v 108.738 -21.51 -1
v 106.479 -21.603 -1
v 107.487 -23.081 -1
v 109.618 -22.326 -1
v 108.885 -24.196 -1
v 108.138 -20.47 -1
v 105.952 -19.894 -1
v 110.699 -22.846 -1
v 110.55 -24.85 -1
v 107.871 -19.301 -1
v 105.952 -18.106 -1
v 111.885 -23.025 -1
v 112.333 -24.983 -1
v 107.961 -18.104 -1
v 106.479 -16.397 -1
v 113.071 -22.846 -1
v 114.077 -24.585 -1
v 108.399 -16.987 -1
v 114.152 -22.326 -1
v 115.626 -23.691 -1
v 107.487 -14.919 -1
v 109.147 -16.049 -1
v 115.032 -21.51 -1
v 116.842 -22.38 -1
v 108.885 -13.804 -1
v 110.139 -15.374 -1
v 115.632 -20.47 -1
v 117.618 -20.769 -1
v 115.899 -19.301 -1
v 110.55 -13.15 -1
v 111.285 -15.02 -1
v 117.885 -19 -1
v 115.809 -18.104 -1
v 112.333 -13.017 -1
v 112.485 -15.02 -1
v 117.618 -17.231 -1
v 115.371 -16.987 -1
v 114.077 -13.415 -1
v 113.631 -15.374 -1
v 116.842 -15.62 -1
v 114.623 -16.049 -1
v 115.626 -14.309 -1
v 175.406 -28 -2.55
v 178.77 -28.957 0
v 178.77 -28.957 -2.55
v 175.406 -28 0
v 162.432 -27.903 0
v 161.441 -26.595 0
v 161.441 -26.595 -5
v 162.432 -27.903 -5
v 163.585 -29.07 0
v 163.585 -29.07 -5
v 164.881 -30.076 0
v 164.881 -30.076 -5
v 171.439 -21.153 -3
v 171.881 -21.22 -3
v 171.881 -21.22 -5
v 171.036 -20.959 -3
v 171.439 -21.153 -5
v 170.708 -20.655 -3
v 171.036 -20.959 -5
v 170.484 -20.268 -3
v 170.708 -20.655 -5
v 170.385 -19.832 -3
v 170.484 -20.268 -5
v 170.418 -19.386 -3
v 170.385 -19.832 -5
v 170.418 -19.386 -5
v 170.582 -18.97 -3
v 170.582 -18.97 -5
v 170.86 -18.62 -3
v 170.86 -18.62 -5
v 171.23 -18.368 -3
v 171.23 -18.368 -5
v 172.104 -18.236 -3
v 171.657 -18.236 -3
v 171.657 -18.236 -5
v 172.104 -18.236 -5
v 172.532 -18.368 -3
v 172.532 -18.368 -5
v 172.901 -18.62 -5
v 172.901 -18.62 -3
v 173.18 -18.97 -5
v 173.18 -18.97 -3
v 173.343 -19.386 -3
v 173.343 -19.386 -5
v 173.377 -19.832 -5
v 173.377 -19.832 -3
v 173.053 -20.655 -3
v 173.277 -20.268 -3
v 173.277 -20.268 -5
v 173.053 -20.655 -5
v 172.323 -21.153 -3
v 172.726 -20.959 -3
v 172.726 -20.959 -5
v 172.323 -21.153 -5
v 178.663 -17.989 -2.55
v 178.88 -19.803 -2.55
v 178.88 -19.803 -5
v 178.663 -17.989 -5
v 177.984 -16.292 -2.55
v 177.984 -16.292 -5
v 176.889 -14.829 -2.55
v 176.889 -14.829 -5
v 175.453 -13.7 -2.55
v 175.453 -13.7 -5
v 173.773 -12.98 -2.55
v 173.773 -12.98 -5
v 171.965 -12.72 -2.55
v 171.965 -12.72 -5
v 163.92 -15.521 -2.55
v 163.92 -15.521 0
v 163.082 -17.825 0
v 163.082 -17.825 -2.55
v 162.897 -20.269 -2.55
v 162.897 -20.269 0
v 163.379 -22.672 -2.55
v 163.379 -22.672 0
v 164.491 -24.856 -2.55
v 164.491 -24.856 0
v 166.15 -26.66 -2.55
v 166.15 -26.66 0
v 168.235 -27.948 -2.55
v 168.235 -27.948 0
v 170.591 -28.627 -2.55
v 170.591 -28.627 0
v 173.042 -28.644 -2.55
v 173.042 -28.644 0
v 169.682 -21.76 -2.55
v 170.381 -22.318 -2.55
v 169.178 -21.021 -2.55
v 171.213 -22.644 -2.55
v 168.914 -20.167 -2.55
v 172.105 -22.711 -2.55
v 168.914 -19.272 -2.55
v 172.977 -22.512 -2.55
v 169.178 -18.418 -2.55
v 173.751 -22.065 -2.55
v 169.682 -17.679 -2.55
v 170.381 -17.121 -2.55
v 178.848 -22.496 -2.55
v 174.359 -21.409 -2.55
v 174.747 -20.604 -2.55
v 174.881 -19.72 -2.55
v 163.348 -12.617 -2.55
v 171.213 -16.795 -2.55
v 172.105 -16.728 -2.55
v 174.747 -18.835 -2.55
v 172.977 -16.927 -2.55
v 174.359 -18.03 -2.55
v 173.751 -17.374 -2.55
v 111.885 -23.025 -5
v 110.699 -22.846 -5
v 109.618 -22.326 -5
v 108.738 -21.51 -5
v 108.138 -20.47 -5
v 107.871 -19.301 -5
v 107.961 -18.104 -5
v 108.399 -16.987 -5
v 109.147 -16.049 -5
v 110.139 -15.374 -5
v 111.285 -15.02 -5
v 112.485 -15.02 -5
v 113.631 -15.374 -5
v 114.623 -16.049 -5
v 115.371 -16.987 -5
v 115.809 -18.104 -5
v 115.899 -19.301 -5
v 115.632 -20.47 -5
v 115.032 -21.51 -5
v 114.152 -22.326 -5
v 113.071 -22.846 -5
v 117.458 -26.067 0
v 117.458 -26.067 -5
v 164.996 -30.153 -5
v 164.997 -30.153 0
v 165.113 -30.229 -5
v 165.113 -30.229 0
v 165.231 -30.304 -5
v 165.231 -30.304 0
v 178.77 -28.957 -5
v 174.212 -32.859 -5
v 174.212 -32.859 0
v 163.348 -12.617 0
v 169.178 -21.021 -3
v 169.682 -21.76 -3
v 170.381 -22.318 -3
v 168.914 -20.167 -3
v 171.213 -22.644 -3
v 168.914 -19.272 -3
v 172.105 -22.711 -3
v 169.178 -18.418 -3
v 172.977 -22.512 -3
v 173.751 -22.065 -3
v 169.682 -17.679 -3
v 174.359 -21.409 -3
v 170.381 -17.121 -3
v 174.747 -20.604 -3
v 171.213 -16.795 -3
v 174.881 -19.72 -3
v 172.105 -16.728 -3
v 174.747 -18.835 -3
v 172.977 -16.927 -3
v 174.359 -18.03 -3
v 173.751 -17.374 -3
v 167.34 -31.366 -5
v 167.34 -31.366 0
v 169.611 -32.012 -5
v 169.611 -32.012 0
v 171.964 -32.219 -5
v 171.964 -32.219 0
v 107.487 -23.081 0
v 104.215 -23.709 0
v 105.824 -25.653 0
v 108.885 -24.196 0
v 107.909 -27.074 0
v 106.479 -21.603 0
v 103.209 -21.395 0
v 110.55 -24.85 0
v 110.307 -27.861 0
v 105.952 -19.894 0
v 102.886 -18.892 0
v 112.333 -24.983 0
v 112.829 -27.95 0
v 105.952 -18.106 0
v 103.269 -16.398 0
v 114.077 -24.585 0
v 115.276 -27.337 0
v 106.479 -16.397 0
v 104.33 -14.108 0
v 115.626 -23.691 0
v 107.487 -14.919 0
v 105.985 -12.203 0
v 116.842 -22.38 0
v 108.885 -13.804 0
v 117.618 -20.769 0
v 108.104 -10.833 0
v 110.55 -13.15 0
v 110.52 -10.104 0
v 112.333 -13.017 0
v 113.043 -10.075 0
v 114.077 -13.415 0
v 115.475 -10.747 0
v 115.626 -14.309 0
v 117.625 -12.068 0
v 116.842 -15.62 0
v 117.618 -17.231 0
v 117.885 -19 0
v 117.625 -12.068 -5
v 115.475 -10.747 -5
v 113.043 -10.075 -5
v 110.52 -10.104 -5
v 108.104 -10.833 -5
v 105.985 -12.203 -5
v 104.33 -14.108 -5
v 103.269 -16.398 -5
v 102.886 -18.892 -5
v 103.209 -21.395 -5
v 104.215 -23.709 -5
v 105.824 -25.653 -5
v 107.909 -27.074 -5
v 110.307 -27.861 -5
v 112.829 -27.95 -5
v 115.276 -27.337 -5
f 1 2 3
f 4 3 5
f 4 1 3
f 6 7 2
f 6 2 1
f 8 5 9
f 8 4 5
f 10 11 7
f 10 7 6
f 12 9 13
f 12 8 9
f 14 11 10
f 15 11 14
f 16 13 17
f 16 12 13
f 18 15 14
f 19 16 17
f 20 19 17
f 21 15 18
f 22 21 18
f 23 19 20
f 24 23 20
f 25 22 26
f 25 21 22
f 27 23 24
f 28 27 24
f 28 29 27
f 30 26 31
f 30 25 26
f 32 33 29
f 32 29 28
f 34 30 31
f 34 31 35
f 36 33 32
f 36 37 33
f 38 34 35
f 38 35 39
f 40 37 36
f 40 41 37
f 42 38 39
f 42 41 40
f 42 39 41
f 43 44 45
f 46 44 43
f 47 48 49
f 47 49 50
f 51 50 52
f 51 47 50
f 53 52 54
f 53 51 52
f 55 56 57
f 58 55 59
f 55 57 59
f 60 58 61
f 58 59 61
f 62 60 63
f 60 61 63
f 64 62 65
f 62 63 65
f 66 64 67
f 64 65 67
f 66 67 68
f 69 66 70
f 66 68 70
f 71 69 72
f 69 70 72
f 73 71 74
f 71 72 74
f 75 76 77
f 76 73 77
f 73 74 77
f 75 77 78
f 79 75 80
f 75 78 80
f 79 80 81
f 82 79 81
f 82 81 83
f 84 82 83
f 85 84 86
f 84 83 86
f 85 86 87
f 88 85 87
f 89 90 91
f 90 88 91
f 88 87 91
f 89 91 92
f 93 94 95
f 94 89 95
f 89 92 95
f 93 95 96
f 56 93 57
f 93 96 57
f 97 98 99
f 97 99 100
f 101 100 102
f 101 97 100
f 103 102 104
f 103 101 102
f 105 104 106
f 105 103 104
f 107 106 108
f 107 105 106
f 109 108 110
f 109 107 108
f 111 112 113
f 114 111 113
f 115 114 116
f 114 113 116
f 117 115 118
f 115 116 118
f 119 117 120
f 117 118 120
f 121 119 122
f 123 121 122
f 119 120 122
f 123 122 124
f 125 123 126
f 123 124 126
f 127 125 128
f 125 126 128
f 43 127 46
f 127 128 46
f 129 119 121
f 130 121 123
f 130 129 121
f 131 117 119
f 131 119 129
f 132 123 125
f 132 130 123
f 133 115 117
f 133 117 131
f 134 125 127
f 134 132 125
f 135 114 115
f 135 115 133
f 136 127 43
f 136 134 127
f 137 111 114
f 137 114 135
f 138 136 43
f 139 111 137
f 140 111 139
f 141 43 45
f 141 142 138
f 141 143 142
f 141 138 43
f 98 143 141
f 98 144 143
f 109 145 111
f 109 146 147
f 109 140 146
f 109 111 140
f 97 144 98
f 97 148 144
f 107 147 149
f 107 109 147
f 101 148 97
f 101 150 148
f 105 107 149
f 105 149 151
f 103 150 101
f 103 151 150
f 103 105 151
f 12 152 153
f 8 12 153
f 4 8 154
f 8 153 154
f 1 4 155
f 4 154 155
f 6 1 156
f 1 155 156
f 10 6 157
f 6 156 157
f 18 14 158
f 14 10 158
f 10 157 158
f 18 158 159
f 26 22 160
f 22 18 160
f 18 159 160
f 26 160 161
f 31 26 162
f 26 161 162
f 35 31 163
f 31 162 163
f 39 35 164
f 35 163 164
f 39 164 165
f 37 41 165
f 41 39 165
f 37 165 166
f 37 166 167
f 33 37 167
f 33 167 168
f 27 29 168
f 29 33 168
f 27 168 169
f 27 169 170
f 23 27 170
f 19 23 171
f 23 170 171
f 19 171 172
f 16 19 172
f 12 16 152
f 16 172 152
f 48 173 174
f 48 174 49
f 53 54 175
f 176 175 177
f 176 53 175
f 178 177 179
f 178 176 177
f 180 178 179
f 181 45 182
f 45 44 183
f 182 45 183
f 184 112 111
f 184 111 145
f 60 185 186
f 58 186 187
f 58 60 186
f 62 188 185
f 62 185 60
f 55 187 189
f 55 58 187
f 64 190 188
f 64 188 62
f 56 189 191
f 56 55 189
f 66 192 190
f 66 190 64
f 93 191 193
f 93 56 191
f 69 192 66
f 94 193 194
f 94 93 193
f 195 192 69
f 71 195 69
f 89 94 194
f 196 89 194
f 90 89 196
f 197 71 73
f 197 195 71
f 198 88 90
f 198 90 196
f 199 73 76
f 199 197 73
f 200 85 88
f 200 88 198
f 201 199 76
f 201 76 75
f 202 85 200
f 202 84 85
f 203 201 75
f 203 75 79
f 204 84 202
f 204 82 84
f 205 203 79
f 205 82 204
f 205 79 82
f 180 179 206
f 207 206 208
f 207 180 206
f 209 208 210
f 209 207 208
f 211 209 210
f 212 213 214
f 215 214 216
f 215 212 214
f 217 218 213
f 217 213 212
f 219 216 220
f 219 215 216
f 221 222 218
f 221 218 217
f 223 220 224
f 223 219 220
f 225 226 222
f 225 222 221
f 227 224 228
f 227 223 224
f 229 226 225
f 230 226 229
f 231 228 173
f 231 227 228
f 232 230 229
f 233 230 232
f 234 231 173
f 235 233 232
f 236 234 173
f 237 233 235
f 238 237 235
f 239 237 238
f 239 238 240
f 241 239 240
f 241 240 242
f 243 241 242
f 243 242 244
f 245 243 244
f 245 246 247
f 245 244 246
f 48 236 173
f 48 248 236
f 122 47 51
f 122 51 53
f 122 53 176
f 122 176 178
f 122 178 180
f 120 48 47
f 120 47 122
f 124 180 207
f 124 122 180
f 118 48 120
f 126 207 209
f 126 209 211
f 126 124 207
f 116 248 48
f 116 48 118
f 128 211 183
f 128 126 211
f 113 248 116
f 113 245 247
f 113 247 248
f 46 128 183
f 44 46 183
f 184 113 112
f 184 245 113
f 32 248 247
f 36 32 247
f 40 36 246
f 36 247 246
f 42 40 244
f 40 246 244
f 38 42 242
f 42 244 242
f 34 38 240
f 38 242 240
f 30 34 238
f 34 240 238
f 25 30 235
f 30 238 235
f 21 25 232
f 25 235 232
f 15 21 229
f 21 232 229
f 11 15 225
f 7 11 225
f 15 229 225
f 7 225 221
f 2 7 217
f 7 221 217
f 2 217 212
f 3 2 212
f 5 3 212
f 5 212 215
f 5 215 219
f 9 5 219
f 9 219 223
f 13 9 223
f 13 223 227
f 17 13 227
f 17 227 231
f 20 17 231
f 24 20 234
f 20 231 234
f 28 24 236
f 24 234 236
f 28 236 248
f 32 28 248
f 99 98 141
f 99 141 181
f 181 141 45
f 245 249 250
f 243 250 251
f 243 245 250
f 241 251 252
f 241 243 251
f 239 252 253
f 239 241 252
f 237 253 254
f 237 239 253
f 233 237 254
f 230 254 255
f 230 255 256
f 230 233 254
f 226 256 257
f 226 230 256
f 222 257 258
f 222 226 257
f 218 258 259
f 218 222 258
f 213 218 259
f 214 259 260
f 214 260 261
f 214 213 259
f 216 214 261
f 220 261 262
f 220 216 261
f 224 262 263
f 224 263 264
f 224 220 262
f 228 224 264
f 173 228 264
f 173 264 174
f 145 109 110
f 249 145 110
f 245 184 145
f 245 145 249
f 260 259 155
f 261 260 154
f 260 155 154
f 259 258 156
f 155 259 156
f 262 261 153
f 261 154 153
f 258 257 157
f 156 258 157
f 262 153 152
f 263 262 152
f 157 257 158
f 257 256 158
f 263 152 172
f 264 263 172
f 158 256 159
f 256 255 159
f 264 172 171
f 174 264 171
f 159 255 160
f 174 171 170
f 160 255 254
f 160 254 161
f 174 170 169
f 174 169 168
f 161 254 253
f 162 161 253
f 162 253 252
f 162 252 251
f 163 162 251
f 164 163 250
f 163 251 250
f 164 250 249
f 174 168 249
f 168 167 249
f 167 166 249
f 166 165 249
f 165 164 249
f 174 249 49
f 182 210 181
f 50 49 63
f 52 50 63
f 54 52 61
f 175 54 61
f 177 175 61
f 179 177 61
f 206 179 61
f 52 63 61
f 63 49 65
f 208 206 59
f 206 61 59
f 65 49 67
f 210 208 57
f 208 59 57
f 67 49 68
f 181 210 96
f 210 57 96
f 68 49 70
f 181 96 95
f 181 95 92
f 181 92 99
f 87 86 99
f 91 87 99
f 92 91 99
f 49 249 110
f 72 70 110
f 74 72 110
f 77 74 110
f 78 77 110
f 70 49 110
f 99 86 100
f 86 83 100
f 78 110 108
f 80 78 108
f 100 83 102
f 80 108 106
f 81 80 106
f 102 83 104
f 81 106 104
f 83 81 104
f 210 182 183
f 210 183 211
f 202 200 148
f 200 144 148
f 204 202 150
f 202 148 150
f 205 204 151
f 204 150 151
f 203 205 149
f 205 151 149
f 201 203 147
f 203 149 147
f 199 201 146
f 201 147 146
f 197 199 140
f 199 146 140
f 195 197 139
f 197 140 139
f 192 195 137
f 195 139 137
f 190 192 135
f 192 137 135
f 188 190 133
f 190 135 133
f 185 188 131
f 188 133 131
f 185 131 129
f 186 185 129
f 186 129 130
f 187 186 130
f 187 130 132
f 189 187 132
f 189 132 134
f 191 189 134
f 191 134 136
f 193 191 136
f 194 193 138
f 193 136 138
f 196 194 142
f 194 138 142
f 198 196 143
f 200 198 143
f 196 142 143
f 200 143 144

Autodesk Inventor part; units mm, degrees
ref_plane "YZ Plane" through (0, 0, 0) normal (1, 0, 0) x (0, 1, 0)
ref_plane "XZ Plane" through (0, 0, 0) normal (0, 1, 0) x (-1, 0, 0)
ref_plane "XY Plane" through (0, 0, 0) normal (0, 0, 1) x (1, 0, 0)
sketch "スケッチ1" plane through (0, 0, 0) normal (0, 0, 1) x (1, 0, 0)
  line L0 (-101.5, 48) -> (108.5, 48)
  circle A0 centre (111.885, -19) radius 4
  circle A1 centre (171.8807, -19.7195) radius 4
  circle A2 centre (111.885, -19) radius 7
  circle A3 centre (171.8807, -19.7195) radius 7
  line L1 (171.8807, -19.7195) -> (111.885, -19) construction
  line L2 (171.9647, -12.72) -> (111.969, -12.0005)
  line L3 (111.8011, -25.9995) -> (171.7968, -26.719)
  arc A4 (171.7968, -26.719) -> (171.9647, -12.72) centre (171.8807, -19.7195) ccw
  arc A5 (111.969, -12.0005) -> (111.8011, -25.9995) centre (111.885, -19) ccw
  line L4 (173.7961, -12.9866) -> (250.1906, -34.7195)
  circle A6 centre (241.9819, -63.5746) radius 30
  line L5 (268.18, -78.1916) -> (221.9512, -41.2414)
  line L6 (221.9512, -41.2414) -> (169.9654, -26.4523)
  line L7 (271.9819, -113.1361) -> (271.9819, -54.8199)
  line L8 (111.885, -19) -> (111.885, 41) construction
  line L9 (118.885, -19) -> (118.885, 41)
  line L10 (104.885, 41) -> (104.885, -19)
  arc A7 (104.885, -19) -> (118.885, -19) centre (111.885, -19) ccw
  arc A8 (118.885, 41) -> (104.885, 41) centre (111.885, 41) ccw
  circle A9 centre (29.4318, 47.238) radius 30
  line L11 (113.3193, 34.1485) -> (35.5787, 17.8745)
  line L12 (-0.5585, 48) -> (57.5489, 36.7771)
  line L13 (57.5489, 36.7771) -> (110.4508, 47.8515)
  circle A10 centre (113.5, -20) radius 68
  line L14 (321.9635, -82.9551) -> (60.2705, 100.2843)
  line L15 (259.1892, -39) -> (111.885, -19)
  arc A11 (93.5924, -27.1048) -> (135.371, -5.9244) centre (95.0604, 21.7941) ccw
  arc A12 (135.371, -5.9244) -> (135.8476, -3.6716) centre (132.899, -4.2246) ccw
  arc A13 (135.8476, -3.6716) -> (83.1833, 18.5565) centre (102.1579, -9.9896) ccw
  line L16 (111.885, -19) -> (112.6892, 40.9946) construction
  line L17 (118.8844, -19.0938) -> (119.6886, 40.9008)
  line L18 (105.6898, 41.0884) -> (104.8857, -18.9062)
  arc A14 (104.8857, -18.9062) -> (118.8844, -19.0938) centre (111.885, -19) ccw
  arc A15 (119.6886, 40.9008) -> (105.6898, 41.0884) centre (112.6892, 40.9946) ccw
  line L19 (164.9949, 48) -> (164.9949, 26)
  line L20 (164.9949, 26) -> (327.4949, -102)
  circle A16 centre (116.2926, -40) radius 68
  circle A17 centre (-98.885, 0) radius 67.5
  line L21 (321.3633, -8.501) -> (-152.6681, 78.4982)
  line L22 (104.8897, -3) -> (104.8897, 0)
  line L23 (104.8897, -3) -> (72.0656, -3)
  line L24 (72.0656, 0) -> (104.8897, 0)
  circle A18 centre (83.3769, -17.5) radius 13.85
  line L25 (178.7705, -28.9572) -> (174.2123, -32.8589)
  line L26 (174.2123, -32.8589) -> (164.8807, -30.2042)
  line L27 (164.8807, -30.2042) -> (164.8807, -19.7195)
  line L28 (169.9654, -26.4523) -> (168.5972, -31.2615)
  line L29 (168.5972, -31.2615) -> (164.8807, -26.636)
  line L30 (178.8802, -19.8034) -> (178.6547, -38.6089)
  line L31 (165.0125, -21.0715) -> (158.1724, 13.6763)
  circle A19 centre (171.8807, -19.7195) radius 7.5
  point P0 (0, 0)
  point P1 (141.8829, -19.3597)
  point P2 (111.885, 11)
  point P3 (105.885, 0)
  point P4 (105.885, 0)
  point P5 (23.7328, -42.729)
  point P6 (112.2871, 10.9973)
  point P7 (169.2723, -12.6877)
  point P8 (163.3482, -12.6166)
  point P9 (164.4925, -18.4296)
  point P10 (172.5552, -27.1891)
  point P11 (178.8479, -22.4958)
  dimension "d0" = 8
  dimension "d1" = 8
  dimension "d2" = 3
  dimension "d3" = 3
  dimension "d4" = 60
  dimension "d5" = 14
  dimension "d6" = 14
  dimension "d7" = 60
  dimension "d8" = 14
  dimension "d9" = 60
  dimension "d10" = 14
  dimension "d11" = 6
  dimension "d12" = 35
  dimension "d13" = 13.271
  dimension "d14" = 14
  dimension "d15" = 20
  dimension "d16" = 15
  dimension "d17" = 22
  dimension "d18" = 150
  dimension "d19" = 162.5
  dimension "d20" = 0
  dimension "d21" = 136
  dimension "d22" = 136
  dimension "d23" = 135
  dimension "d24" = 38.227
  dimension "d25" = 18
  dimension "d27" = 5
  dimension "d28" = 6
  dimension "d30" = 101.823
  dimension "d31" = 101.823
  dimension "d32" = 0.5
extrude "押し出し1" add sketch "スケッチ1" against normal blind 5 contours L25 L26 L28 A19 L15 L6 | L6 L15 L30 | L15 A19 L6 | L6 A19 L30 L15 | A19 L15 L28 L3 L6 | L6 L3 A3 L30 A19 | A19 L28 L15 | L29 L3 L15 A19 L28 | L26 L27 L29 | A2 A11 | L6 A3 L3 | L3 L28 L6 | L28 A19 L15 | L15 A19 L3 L28 | L27 L15 L3 | L3 A2 A11 L15 L27 | A3 | L9 A2 L2 | L2 L17 L9 | L3 A19 L27 L31 A3 L28 | L15 L3 A19 | A2 A11 | L15 L27 A19 L3 | L15 A11 L2 L31 A19 L27 | A19 L31 L2 | L2 A3 L27 L31 A19 | L2 A11 L15 A2 L17 | L31 L27 A3 | A2 L15 A11 | A19 L31 L27 | A0 | A1
extrude "押し出し2" cut sketch "スケッチ1" against normal blind 2.55 contours L6 L15 L30 | L6 A19 L30 L15 | A19 L15 L28 L3 L6 | L6 L3 A3 L30 A19 | A19 L28 L15 | L30 A3 L4 A19 | L6 A3 L3 | L3 L28 L6 | L28 A19 L15 | L15 A19 L3 L28 | A3 | L4 A3 L2 A19 | L3 A19 L27 L31 A3 L28 | A19 L31 L2 | L2 A3 L27 L31 A19 | L31 L27 A3 | A19 L31 L27 | A1
hole "穴1" at (105.885, 0, 0) at (23.7328, -42.729, 0) at (116.2926, -40, 0) at (-98.885, 0, 0) at (171.8807, -19.7195, 0) direction (0, 0, -1) diameter 3 depth 12 tip angle 118
sketch "スケッチ2" plane through (0, 0, 0) normal (0, 0, 1) x (1, 0, 0)
  line L0 (163.3482, -12.6166) -> (164.4925, -18.4296) projected
  arc A0 (164.4925, -18.4296) -> (172.5552, -27.1891) centre (171.8807, -19.7195) ccw projected
  line L1 (172.5552, -27.1891) -> (178.7705, -28.9572) projected
  line L2 (178.7705, -28.9572) -> (174.2123, -32.8589) projected
  line L3 (174.2123, -32.8589) -> (164.8807, -30.2042) projected
  line L4 (164.8807, -30.2042) -> (164.8807, -26.636) projected
  line L5 (164.8807, -26.636) -> (111.8011, -25.9995) projected
  arc A1 (111.969, -12.0005) -> (111.8011, -25.9995) centre (111.885, -19) ccw projected
  line L6 (111.969, -12.0005) -> (163.3482, -12.6166) projected
  circle A2 centre (171.8807, -19.7195) radius 7.5
  circle A3 centre (171.8807, -19.7195) radius 12.5
  point P0 (0, 0)
  point P1 (161.4414, -26.5948)
  point P2 (164.8807, -30.0756)
  point P3 (165.2308, -30.3038)
  point P4 (171.9637, -32.2192)
  dimension "d44" = 5
extrude "押し出し3" add sketch "スケッチ2" against normal blind 5 contours L5 L4 A3 | A3 L3
sketch "スケッチ3" plane through (0, 0, 0) normal (0, 0, 1) x (1, 0, 0)
  line L0 (163.3482, -12.6166) -> (164.4925, -18.4296) projected
  arc A0 (164.4925, -18.4296) -> (172.5552, -27.1891) centre (171.8807, -19.7195) ccw projected
  line L1 (172.5552, -27.1891) -> (178.7705, -28.9572) projected
  line L2 (178.7705, -28.9572) -> (174.2123, -32.8589) projected
  line L3 (174.2123, -32.8589) -> (171.9637, -32.2192) projected
  arc A1 (165.2308, -30.3038) -> (171.9637, -32.2192) centre (171.8807, -19.7195) ccw projected
  line L4 (165.2308, -30.3038) -> (164.8807, -30.2042) projected
  line L5 (164.8807, -30.2042) -> (164.8807, -30.0756) projected
  arc A2 (161.4414, -26.5948) -> (164.8807, -30.0756) centre (171.8807, -19.7195) ccw projected
  line L6 (161.4414, -26.5948) -> (111.8011, -25.9995) projected
  arc A3 (111.969, -12.0005) -> (111.8011, -25.9995) centre (111.885, -19) ccw projected
  line L7 (111.969, -12.0005) -> (163.3482, -12.6166) projected
  circle A4 centre (171.8807, -19.7195) radius 12.5
  point P0 (0, 0)
  point P1 (165.2308, -30.3038)
extrude "押し出し4" cut sketch "スケッチ3" against normal blind 10 contours A4 L4 L5
hole "穴2" at (105.885, 0, 0) at (111.885, -19, 0) direction (0, 0, -1) diameter 8.05 depth 12 tip angle 118
sketch "スケッチ4" plane through (0, 0, 0) normal (0, 0, 1) x (1, 0, 0)
  circle A0 centre (111.885, -19) radius 4.025 projected
  line L0 (163.3482, -12.6166) -> (164.4925, -18.4296) projected
  arc A1 (164.4925, -18.4296) -> (172.5552, -27.1891) centre (171.8807, -19.7195) ccw projected
  line L1 (172.5552, -27.1891) -> (178.7705, -28.9572) projected
  line L2 (178.7705, -28.9572) -> (174.2123, -32.8589) projected
  line L3 (174.2123, -32.8589) -> (171.9637, -32.2192) projected
  arc A2 (161.4414, -26.5948) -> (171.9637, -32.2192) centre (171.8807, -19.7195) ccw projected
  line L4 (161.4414, -26.5948) -> (111.8011, -25.9995) projected
  arc A3 (111.969, -12.0005) -> (111.8011, -25.9995) centre (111.885, -19) ccw projected
  line L5 (111.969, -12.0005) -> (163.3482, -12.6166) projected
  arc A4 (164.4925, -18.4296) -> (172.5552, -27.1891) centre (171.8807, -19.7195) ccw projected
  circle A5 centre (171.8807, -19.7195) radius 7.5
  circle A6 centre (171.8807, -19.7195) radius 9
  line L6 (178.7705, -28.9572) -> (172.5552, -27.1891) projected
  line L7 (164.4925, -18.4296) -> (163.3482, -12.6166) projected
  circle A7 centre (111.885, -19) radius 9
  point P0 (0, 0)
  point P1 (175.4063, -28.0002)
  point P2 (163.9203, -15.5231)
  point P3 (163.92, -15.5211)
  point P4 (175.4063, -28.0002)
  dimension "d56" = 15
  dimension "d57" = 1.5
  dimension "d58" = 18
extrude "押し出し5" add sketch "スケッチ4" against normal blind 5 contours A7 L4 A3 L5 | L5 A3 L4 A7
extrude "押し出し6" cut sketch "スケッチ4" against normal blind 2.55 contours L0 A1 L1 A6
sketch "スケッチ5" plane through (0, 0, 0) normal (0, 0, 1) x (1, 0, 0)
  arc A0 (117.6254, -12.0683) -> (117.4576, -26.0673) centre (111.885, -19) ccw projected
  line L0 (117.6254, -12.0683) -> (163.3482, -12.6166) projected
  line L1 (163.3482, -12.6166) -> (163.92, -15.5211) projected
  arc A1 (163.92, -15.5211) -> (175.4063, -28.0002) centre (171.8807, -19.7195) ccw projected
  line L2 (175.4063, -28.0002) -> (178.7705, -28.9572) projected
  line L3 (178.7705, -28.9572) -> (174.2123, -32.8589) projected
  line L4 (174.2123, -32.8589) -> (171.9637, -32.2192) projected
  arc A2 (161.4414, -26.5948) -> (171.9637, -32.2192) centre (171.8807, -19.7195) ccw projected
  line L5 (161.4414, -26.5948) -> (117.4576, -26.0673) projected
  circle A3 centre (111.885, -19) radius 4.025 projected
  circle A4 centre (111.885, -19) radius 6
  point P0 (0, 0)
  dimension "d63" = 12
extrude "押し出し7" cut sketch "スケッチ5" against normal blind 1 contours A4
sketch "スケッチ6" plane through (0, 0, 0) normal (0, 0, 1) x (1, 0, 0)
  circle A0 centre (111.885, -19) radius 6 projected
  arc A1 (161.4414, -26.5948) -> (171.9637, -32.2192) centre (171.8807, -19.7195) ccw projected
  line L0 (161.4414, -26.5948) -> (117.4576, -26.0673) projected
  arc A2 (117.6254, -12.0683) -> (117.4576, -26.0673) centre (111.885, -19) ccw projected
  line L1 (117.6254, -12.0683) -> (163.3482, -12.6166) projected
  line L2 (163.3482, -12.6166) -> (163.92, -15.5211) projected
  arc A3 (163.92, -15.5211) -> (175.4063, -28.0002) centre (171.8807, -19.7195) ccw projected
  line L3 (175.4063, -28.0002) -> (178.7705, -28.9572) projected
  line L4 (178.7705, -28.9572) -> (174.2123, -32.8589) projected
  line L5 (174.2123, -32.8589) -> (171.9637, -32.2192) projected
  circle A4 centre (171.8807, -19.7195) radius 1.5 projected
  circle A5 centre (171.8807, -19.7195) radius 3
  point P0 (0, 0)
  dimension "d66" = 6
extrude "押し出し8" cut sketch "スケッチ6" against normal blind 3 contours A5
equation "\"d9\" = d7"
equation "\"d31\" = d30"
properties part number "後ろウィング中間"
